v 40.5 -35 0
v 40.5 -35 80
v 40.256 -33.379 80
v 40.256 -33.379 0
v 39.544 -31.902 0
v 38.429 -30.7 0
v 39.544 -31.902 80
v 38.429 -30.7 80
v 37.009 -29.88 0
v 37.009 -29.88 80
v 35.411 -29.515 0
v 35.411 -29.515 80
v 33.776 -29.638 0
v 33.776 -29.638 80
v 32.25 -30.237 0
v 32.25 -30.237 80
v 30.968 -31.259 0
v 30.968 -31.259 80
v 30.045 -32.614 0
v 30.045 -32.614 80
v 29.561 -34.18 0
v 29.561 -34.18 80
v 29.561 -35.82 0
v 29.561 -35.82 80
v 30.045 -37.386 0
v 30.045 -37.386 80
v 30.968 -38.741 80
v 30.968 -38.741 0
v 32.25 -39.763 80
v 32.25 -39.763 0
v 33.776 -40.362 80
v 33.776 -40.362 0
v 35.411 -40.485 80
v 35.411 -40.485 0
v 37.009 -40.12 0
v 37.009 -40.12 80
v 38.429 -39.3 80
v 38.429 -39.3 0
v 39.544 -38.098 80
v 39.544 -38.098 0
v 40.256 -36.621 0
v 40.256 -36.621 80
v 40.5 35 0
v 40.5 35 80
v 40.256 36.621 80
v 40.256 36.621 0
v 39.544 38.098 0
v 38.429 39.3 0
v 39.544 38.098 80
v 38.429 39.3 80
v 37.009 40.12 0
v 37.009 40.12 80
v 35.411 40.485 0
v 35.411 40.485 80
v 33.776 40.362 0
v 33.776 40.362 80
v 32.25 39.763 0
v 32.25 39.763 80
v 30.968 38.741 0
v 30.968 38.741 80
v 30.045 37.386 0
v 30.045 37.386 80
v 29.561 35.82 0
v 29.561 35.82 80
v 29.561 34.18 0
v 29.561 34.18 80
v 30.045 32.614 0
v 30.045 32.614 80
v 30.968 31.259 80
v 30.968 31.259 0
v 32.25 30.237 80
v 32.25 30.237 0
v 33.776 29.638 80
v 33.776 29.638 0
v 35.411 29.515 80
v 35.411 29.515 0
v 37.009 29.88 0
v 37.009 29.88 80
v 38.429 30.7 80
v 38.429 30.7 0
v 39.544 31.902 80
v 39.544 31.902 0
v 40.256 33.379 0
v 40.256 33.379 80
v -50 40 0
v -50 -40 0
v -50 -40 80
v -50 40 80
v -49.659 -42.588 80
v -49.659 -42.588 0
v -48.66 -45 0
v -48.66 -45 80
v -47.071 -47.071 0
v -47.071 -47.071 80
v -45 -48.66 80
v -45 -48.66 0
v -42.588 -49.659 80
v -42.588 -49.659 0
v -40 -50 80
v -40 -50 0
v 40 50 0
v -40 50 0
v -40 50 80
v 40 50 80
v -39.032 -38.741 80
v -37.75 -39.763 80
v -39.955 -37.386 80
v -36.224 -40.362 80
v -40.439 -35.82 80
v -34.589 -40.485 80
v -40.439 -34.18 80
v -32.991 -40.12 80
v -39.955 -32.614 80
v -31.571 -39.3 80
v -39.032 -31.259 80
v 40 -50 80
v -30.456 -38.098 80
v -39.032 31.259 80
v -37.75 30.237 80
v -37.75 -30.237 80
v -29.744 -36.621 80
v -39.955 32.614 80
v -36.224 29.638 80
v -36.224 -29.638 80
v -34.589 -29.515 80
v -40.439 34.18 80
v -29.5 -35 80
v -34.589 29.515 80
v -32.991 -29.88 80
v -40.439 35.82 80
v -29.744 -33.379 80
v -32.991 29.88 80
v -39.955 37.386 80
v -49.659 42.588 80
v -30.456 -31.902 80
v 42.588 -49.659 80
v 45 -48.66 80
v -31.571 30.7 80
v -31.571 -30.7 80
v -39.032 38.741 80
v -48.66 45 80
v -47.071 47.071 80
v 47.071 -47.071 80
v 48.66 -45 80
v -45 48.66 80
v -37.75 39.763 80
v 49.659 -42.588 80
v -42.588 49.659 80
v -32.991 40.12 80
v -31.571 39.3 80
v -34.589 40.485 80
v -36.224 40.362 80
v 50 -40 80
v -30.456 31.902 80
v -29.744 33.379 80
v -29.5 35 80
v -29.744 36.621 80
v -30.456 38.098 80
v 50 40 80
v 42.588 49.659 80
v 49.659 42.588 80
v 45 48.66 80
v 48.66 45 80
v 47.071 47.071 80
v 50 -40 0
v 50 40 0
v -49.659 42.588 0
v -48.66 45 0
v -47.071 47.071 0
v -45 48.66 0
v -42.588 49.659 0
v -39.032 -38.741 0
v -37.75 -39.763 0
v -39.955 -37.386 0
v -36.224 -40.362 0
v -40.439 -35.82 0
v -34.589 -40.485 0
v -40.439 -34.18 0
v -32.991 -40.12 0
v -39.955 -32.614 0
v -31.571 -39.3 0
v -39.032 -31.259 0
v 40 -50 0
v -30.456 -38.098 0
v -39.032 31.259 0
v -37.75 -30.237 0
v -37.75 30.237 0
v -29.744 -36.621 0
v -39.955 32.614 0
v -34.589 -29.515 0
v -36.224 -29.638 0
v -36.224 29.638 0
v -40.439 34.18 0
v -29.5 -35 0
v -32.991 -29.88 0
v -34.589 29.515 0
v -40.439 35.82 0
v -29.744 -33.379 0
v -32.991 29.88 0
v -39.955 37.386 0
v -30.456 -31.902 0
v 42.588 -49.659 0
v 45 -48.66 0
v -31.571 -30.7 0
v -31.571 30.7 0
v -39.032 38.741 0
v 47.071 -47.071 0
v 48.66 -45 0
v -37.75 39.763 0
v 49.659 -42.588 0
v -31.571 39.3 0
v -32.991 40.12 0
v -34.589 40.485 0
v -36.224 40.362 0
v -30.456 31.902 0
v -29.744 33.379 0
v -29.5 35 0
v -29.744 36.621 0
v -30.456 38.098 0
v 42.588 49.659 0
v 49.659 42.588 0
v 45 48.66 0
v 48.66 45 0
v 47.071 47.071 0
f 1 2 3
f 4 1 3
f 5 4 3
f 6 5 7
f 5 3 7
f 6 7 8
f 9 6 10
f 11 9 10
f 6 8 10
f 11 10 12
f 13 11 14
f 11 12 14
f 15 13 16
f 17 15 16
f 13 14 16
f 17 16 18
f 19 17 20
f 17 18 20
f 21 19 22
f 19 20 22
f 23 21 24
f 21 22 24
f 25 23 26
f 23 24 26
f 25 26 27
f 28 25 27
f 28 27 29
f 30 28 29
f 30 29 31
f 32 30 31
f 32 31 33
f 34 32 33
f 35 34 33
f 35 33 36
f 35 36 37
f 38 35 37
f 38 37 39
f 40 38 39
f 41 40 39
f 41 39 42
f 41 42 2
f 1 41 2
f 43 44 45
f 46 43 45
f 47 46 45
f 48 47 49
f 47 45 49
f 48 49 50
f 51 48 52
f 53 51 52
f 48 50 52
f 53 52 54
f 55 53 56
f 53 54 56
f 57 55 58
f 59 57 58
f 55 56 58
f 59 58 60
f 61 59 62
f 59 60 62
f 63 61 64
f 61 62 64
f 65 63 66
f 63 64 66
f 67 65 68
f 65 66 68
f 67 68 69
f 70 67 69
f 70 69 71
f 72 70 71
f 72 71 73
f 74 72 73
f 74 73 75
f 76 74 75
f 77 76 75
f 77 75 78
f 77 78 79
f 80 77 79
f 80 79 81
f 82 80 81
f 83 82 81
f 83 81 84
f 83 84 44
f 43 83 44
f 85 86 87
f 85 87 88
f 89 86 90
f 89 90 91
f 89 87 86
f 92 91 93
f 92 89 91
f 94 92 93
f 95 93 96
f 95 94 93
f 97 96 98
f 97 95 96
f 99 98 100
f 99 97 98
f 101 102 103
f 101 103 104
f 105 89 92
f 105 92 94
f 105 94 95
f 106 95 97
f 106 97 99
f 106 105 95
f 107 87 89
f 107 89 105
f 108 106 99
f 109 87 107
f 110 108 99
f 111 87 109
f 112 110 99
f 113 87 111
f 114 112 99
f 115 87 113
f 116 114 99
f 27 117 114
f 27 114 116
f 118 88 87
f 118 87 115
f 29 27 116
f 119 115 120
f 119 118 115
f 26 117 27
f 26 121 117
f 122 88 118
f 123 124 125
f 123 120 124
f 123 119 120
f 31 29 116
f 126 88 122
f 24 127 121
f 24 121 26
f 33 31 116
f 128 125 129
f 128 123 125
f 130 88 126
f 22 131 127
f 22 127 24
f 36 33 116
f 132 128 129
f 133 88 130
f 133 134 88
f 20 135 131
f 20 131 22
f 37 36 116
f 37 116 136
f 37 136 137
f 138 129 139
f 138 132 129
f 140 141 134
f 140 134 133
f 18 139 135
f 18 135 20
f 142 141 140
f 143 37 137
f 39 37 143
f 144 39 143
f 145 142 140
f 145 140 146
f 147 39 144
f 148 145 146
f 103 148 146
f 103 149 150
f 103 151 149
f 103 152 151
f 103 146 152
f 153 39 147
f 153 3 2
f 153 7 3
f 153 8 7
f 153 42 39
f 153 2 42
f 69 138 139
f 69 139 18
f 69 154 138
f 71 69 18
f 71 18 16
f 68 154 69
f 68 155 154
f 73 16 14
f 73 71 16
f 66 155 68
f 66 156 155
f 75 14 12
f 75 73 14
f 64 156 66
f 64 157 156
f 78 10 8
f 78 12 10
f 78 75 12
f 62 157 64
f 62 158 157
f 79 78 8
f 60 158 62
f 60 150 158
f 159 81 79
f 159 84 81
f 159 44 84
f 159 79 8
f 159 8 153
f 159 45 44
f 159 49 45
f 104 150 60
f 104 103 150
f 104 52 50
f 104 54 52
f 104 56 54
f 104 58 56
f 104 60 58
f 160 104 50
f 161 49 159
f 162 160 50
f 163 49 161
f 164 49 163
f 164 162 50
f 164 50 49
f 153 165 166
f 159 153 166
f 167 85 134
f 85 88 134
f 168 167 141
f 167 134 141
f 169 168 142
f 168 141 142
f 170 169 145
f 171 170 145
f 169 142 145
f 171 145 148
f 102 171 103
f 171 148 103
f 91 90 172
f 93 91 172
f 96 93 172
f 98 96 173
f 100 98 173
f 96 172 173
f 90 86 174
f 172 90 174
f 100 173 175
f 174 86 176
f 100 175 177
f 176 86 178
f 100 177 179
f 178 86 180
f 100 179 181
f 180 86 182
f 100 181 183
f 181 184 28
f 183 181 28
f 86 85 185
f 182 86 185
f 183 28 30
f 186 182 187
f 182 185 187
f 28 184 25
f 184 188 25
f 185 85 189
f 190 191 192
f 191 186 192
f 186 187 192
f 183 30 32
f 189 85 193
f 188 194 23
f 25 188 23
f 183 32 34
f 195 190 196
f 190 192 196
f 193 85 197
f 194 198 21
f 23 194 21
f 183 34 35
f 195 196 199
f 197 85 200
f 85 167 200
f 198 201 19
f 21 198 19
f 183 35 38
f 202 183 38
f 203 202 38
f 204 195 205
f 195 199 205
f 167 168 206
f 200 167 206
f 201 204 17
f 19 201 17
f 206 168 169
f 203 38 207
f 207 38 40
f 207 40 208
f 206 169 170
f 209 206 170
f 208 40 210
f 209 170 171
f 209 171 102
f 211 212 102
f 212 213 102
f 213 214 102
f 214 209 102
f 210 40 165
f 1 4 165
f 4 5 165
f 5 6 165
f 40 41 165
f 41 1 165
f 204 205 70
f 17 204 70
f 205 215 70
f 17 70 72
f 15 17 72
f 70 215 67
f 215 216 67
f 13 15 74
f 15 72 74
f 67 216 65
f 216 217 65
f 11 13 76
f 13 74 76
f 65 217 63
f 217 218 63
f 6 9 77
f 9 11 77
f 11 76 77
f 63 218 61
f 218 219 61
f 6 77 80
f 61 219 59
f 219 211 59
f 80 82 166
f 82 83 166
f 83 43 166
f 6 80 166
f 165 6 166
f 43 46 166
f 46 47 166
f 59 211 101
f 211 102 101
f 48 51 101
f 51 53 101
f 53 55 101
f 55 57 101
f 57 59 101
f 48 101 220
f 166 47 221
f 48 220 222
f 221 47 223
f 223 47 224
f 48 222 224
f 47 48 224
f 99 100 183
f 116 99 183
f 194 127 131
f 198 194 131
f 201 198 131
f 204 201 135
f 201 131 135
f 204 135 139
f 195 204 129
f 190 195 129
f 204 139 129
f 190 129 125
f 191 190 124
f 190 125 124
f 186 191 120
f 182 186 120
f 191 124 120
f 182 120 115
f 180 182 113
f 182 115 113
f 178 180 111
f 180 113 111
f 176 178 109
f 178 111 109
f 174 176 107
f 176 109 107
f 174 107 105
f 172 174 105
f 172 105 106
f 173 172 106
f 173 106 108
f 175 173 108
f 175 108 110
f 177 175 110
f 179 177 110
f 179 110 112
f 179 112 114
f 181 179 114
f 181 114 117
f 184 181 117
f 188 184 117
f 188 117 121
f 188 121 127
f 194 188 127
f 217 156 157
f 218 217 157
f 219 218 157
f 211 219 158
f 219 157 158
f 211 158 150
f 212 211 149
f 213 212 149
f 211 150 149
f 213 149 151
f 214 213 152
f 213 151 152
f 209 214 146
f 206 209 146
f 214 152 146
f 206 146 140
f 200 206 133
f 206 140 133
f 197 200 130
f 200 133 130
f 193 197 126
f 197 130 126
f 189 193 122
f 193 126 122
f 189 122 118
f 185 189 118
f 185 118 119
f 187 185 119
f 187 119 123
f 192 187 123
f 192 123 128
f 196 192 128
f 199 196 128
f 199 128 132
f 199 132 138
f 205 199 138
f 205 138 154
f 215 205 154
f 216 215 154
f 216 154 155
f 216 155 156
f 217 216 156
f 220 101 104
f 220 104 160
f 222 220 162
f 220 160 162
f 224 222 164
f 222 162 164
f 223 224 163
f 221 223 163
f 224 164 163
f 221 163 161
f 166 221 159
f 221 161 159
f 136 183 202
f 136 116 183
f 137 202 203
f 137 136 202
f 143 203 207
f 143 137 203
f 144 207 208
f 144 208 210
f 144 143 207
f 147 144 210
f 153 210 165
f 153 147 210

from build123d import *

# Parameters (mm, degrees)
SKETCH_1_W          = 100
SKETCH_1_H          = 100
EXTRUDE_1_DEPTH     = 80
SKETCH_2_R          = 5.5
CUT_EXTRUDE_2_DEPTH = 107.77078252
FILLET_1_R          = 10
FILLET_2_R          = 10


with BuildPart() as part:
    # 草图1 → 凸台-拉伸1 (new body)
    with BuildSketch(Plane.XY):
        Rectangle(SKETCH_1_W, SKETCH_1_H)
    extrude(amount=EXTRUDE_1_DEPTH)

    # 草图2 → 切除-拉伸2 (cut, through all)
    with BuildSketch(Plane.XY.offset(80)):
        with Locations((-35, 35)):
            Circle(SKETCH_2_R)
        with Locations((35, 35)):
            Circle(SKETCH_2_R)
        with Locations((-35, -35)):
            Circle(SKETCH_2_R)
        with Locations((35, -35)):
            Circle(SKETCH_2_R)
    extrude(amount=-CUT_EXTRUDE_2_DEPTH, mode=Mode.SUBTRACT)

    # 圆角1
    fillet_1_edges = [part.edges().sort_by_distance(p)[0] for p in [
        (-50, 50, 40),
    ]]
    fillet(fillet_1_edges, radius=FILLET_1_R)

    # 圆角2
    fillet_2_edges = [part.edges().sort_by_distance(p)[0] for p in [
        (50, -50, 40),
        (-50, -50, 40),
        (50, 50, 40),
    ]]
    fillet(fillet_2_edges, radius=FILLET_2_R)


solid = part.part
